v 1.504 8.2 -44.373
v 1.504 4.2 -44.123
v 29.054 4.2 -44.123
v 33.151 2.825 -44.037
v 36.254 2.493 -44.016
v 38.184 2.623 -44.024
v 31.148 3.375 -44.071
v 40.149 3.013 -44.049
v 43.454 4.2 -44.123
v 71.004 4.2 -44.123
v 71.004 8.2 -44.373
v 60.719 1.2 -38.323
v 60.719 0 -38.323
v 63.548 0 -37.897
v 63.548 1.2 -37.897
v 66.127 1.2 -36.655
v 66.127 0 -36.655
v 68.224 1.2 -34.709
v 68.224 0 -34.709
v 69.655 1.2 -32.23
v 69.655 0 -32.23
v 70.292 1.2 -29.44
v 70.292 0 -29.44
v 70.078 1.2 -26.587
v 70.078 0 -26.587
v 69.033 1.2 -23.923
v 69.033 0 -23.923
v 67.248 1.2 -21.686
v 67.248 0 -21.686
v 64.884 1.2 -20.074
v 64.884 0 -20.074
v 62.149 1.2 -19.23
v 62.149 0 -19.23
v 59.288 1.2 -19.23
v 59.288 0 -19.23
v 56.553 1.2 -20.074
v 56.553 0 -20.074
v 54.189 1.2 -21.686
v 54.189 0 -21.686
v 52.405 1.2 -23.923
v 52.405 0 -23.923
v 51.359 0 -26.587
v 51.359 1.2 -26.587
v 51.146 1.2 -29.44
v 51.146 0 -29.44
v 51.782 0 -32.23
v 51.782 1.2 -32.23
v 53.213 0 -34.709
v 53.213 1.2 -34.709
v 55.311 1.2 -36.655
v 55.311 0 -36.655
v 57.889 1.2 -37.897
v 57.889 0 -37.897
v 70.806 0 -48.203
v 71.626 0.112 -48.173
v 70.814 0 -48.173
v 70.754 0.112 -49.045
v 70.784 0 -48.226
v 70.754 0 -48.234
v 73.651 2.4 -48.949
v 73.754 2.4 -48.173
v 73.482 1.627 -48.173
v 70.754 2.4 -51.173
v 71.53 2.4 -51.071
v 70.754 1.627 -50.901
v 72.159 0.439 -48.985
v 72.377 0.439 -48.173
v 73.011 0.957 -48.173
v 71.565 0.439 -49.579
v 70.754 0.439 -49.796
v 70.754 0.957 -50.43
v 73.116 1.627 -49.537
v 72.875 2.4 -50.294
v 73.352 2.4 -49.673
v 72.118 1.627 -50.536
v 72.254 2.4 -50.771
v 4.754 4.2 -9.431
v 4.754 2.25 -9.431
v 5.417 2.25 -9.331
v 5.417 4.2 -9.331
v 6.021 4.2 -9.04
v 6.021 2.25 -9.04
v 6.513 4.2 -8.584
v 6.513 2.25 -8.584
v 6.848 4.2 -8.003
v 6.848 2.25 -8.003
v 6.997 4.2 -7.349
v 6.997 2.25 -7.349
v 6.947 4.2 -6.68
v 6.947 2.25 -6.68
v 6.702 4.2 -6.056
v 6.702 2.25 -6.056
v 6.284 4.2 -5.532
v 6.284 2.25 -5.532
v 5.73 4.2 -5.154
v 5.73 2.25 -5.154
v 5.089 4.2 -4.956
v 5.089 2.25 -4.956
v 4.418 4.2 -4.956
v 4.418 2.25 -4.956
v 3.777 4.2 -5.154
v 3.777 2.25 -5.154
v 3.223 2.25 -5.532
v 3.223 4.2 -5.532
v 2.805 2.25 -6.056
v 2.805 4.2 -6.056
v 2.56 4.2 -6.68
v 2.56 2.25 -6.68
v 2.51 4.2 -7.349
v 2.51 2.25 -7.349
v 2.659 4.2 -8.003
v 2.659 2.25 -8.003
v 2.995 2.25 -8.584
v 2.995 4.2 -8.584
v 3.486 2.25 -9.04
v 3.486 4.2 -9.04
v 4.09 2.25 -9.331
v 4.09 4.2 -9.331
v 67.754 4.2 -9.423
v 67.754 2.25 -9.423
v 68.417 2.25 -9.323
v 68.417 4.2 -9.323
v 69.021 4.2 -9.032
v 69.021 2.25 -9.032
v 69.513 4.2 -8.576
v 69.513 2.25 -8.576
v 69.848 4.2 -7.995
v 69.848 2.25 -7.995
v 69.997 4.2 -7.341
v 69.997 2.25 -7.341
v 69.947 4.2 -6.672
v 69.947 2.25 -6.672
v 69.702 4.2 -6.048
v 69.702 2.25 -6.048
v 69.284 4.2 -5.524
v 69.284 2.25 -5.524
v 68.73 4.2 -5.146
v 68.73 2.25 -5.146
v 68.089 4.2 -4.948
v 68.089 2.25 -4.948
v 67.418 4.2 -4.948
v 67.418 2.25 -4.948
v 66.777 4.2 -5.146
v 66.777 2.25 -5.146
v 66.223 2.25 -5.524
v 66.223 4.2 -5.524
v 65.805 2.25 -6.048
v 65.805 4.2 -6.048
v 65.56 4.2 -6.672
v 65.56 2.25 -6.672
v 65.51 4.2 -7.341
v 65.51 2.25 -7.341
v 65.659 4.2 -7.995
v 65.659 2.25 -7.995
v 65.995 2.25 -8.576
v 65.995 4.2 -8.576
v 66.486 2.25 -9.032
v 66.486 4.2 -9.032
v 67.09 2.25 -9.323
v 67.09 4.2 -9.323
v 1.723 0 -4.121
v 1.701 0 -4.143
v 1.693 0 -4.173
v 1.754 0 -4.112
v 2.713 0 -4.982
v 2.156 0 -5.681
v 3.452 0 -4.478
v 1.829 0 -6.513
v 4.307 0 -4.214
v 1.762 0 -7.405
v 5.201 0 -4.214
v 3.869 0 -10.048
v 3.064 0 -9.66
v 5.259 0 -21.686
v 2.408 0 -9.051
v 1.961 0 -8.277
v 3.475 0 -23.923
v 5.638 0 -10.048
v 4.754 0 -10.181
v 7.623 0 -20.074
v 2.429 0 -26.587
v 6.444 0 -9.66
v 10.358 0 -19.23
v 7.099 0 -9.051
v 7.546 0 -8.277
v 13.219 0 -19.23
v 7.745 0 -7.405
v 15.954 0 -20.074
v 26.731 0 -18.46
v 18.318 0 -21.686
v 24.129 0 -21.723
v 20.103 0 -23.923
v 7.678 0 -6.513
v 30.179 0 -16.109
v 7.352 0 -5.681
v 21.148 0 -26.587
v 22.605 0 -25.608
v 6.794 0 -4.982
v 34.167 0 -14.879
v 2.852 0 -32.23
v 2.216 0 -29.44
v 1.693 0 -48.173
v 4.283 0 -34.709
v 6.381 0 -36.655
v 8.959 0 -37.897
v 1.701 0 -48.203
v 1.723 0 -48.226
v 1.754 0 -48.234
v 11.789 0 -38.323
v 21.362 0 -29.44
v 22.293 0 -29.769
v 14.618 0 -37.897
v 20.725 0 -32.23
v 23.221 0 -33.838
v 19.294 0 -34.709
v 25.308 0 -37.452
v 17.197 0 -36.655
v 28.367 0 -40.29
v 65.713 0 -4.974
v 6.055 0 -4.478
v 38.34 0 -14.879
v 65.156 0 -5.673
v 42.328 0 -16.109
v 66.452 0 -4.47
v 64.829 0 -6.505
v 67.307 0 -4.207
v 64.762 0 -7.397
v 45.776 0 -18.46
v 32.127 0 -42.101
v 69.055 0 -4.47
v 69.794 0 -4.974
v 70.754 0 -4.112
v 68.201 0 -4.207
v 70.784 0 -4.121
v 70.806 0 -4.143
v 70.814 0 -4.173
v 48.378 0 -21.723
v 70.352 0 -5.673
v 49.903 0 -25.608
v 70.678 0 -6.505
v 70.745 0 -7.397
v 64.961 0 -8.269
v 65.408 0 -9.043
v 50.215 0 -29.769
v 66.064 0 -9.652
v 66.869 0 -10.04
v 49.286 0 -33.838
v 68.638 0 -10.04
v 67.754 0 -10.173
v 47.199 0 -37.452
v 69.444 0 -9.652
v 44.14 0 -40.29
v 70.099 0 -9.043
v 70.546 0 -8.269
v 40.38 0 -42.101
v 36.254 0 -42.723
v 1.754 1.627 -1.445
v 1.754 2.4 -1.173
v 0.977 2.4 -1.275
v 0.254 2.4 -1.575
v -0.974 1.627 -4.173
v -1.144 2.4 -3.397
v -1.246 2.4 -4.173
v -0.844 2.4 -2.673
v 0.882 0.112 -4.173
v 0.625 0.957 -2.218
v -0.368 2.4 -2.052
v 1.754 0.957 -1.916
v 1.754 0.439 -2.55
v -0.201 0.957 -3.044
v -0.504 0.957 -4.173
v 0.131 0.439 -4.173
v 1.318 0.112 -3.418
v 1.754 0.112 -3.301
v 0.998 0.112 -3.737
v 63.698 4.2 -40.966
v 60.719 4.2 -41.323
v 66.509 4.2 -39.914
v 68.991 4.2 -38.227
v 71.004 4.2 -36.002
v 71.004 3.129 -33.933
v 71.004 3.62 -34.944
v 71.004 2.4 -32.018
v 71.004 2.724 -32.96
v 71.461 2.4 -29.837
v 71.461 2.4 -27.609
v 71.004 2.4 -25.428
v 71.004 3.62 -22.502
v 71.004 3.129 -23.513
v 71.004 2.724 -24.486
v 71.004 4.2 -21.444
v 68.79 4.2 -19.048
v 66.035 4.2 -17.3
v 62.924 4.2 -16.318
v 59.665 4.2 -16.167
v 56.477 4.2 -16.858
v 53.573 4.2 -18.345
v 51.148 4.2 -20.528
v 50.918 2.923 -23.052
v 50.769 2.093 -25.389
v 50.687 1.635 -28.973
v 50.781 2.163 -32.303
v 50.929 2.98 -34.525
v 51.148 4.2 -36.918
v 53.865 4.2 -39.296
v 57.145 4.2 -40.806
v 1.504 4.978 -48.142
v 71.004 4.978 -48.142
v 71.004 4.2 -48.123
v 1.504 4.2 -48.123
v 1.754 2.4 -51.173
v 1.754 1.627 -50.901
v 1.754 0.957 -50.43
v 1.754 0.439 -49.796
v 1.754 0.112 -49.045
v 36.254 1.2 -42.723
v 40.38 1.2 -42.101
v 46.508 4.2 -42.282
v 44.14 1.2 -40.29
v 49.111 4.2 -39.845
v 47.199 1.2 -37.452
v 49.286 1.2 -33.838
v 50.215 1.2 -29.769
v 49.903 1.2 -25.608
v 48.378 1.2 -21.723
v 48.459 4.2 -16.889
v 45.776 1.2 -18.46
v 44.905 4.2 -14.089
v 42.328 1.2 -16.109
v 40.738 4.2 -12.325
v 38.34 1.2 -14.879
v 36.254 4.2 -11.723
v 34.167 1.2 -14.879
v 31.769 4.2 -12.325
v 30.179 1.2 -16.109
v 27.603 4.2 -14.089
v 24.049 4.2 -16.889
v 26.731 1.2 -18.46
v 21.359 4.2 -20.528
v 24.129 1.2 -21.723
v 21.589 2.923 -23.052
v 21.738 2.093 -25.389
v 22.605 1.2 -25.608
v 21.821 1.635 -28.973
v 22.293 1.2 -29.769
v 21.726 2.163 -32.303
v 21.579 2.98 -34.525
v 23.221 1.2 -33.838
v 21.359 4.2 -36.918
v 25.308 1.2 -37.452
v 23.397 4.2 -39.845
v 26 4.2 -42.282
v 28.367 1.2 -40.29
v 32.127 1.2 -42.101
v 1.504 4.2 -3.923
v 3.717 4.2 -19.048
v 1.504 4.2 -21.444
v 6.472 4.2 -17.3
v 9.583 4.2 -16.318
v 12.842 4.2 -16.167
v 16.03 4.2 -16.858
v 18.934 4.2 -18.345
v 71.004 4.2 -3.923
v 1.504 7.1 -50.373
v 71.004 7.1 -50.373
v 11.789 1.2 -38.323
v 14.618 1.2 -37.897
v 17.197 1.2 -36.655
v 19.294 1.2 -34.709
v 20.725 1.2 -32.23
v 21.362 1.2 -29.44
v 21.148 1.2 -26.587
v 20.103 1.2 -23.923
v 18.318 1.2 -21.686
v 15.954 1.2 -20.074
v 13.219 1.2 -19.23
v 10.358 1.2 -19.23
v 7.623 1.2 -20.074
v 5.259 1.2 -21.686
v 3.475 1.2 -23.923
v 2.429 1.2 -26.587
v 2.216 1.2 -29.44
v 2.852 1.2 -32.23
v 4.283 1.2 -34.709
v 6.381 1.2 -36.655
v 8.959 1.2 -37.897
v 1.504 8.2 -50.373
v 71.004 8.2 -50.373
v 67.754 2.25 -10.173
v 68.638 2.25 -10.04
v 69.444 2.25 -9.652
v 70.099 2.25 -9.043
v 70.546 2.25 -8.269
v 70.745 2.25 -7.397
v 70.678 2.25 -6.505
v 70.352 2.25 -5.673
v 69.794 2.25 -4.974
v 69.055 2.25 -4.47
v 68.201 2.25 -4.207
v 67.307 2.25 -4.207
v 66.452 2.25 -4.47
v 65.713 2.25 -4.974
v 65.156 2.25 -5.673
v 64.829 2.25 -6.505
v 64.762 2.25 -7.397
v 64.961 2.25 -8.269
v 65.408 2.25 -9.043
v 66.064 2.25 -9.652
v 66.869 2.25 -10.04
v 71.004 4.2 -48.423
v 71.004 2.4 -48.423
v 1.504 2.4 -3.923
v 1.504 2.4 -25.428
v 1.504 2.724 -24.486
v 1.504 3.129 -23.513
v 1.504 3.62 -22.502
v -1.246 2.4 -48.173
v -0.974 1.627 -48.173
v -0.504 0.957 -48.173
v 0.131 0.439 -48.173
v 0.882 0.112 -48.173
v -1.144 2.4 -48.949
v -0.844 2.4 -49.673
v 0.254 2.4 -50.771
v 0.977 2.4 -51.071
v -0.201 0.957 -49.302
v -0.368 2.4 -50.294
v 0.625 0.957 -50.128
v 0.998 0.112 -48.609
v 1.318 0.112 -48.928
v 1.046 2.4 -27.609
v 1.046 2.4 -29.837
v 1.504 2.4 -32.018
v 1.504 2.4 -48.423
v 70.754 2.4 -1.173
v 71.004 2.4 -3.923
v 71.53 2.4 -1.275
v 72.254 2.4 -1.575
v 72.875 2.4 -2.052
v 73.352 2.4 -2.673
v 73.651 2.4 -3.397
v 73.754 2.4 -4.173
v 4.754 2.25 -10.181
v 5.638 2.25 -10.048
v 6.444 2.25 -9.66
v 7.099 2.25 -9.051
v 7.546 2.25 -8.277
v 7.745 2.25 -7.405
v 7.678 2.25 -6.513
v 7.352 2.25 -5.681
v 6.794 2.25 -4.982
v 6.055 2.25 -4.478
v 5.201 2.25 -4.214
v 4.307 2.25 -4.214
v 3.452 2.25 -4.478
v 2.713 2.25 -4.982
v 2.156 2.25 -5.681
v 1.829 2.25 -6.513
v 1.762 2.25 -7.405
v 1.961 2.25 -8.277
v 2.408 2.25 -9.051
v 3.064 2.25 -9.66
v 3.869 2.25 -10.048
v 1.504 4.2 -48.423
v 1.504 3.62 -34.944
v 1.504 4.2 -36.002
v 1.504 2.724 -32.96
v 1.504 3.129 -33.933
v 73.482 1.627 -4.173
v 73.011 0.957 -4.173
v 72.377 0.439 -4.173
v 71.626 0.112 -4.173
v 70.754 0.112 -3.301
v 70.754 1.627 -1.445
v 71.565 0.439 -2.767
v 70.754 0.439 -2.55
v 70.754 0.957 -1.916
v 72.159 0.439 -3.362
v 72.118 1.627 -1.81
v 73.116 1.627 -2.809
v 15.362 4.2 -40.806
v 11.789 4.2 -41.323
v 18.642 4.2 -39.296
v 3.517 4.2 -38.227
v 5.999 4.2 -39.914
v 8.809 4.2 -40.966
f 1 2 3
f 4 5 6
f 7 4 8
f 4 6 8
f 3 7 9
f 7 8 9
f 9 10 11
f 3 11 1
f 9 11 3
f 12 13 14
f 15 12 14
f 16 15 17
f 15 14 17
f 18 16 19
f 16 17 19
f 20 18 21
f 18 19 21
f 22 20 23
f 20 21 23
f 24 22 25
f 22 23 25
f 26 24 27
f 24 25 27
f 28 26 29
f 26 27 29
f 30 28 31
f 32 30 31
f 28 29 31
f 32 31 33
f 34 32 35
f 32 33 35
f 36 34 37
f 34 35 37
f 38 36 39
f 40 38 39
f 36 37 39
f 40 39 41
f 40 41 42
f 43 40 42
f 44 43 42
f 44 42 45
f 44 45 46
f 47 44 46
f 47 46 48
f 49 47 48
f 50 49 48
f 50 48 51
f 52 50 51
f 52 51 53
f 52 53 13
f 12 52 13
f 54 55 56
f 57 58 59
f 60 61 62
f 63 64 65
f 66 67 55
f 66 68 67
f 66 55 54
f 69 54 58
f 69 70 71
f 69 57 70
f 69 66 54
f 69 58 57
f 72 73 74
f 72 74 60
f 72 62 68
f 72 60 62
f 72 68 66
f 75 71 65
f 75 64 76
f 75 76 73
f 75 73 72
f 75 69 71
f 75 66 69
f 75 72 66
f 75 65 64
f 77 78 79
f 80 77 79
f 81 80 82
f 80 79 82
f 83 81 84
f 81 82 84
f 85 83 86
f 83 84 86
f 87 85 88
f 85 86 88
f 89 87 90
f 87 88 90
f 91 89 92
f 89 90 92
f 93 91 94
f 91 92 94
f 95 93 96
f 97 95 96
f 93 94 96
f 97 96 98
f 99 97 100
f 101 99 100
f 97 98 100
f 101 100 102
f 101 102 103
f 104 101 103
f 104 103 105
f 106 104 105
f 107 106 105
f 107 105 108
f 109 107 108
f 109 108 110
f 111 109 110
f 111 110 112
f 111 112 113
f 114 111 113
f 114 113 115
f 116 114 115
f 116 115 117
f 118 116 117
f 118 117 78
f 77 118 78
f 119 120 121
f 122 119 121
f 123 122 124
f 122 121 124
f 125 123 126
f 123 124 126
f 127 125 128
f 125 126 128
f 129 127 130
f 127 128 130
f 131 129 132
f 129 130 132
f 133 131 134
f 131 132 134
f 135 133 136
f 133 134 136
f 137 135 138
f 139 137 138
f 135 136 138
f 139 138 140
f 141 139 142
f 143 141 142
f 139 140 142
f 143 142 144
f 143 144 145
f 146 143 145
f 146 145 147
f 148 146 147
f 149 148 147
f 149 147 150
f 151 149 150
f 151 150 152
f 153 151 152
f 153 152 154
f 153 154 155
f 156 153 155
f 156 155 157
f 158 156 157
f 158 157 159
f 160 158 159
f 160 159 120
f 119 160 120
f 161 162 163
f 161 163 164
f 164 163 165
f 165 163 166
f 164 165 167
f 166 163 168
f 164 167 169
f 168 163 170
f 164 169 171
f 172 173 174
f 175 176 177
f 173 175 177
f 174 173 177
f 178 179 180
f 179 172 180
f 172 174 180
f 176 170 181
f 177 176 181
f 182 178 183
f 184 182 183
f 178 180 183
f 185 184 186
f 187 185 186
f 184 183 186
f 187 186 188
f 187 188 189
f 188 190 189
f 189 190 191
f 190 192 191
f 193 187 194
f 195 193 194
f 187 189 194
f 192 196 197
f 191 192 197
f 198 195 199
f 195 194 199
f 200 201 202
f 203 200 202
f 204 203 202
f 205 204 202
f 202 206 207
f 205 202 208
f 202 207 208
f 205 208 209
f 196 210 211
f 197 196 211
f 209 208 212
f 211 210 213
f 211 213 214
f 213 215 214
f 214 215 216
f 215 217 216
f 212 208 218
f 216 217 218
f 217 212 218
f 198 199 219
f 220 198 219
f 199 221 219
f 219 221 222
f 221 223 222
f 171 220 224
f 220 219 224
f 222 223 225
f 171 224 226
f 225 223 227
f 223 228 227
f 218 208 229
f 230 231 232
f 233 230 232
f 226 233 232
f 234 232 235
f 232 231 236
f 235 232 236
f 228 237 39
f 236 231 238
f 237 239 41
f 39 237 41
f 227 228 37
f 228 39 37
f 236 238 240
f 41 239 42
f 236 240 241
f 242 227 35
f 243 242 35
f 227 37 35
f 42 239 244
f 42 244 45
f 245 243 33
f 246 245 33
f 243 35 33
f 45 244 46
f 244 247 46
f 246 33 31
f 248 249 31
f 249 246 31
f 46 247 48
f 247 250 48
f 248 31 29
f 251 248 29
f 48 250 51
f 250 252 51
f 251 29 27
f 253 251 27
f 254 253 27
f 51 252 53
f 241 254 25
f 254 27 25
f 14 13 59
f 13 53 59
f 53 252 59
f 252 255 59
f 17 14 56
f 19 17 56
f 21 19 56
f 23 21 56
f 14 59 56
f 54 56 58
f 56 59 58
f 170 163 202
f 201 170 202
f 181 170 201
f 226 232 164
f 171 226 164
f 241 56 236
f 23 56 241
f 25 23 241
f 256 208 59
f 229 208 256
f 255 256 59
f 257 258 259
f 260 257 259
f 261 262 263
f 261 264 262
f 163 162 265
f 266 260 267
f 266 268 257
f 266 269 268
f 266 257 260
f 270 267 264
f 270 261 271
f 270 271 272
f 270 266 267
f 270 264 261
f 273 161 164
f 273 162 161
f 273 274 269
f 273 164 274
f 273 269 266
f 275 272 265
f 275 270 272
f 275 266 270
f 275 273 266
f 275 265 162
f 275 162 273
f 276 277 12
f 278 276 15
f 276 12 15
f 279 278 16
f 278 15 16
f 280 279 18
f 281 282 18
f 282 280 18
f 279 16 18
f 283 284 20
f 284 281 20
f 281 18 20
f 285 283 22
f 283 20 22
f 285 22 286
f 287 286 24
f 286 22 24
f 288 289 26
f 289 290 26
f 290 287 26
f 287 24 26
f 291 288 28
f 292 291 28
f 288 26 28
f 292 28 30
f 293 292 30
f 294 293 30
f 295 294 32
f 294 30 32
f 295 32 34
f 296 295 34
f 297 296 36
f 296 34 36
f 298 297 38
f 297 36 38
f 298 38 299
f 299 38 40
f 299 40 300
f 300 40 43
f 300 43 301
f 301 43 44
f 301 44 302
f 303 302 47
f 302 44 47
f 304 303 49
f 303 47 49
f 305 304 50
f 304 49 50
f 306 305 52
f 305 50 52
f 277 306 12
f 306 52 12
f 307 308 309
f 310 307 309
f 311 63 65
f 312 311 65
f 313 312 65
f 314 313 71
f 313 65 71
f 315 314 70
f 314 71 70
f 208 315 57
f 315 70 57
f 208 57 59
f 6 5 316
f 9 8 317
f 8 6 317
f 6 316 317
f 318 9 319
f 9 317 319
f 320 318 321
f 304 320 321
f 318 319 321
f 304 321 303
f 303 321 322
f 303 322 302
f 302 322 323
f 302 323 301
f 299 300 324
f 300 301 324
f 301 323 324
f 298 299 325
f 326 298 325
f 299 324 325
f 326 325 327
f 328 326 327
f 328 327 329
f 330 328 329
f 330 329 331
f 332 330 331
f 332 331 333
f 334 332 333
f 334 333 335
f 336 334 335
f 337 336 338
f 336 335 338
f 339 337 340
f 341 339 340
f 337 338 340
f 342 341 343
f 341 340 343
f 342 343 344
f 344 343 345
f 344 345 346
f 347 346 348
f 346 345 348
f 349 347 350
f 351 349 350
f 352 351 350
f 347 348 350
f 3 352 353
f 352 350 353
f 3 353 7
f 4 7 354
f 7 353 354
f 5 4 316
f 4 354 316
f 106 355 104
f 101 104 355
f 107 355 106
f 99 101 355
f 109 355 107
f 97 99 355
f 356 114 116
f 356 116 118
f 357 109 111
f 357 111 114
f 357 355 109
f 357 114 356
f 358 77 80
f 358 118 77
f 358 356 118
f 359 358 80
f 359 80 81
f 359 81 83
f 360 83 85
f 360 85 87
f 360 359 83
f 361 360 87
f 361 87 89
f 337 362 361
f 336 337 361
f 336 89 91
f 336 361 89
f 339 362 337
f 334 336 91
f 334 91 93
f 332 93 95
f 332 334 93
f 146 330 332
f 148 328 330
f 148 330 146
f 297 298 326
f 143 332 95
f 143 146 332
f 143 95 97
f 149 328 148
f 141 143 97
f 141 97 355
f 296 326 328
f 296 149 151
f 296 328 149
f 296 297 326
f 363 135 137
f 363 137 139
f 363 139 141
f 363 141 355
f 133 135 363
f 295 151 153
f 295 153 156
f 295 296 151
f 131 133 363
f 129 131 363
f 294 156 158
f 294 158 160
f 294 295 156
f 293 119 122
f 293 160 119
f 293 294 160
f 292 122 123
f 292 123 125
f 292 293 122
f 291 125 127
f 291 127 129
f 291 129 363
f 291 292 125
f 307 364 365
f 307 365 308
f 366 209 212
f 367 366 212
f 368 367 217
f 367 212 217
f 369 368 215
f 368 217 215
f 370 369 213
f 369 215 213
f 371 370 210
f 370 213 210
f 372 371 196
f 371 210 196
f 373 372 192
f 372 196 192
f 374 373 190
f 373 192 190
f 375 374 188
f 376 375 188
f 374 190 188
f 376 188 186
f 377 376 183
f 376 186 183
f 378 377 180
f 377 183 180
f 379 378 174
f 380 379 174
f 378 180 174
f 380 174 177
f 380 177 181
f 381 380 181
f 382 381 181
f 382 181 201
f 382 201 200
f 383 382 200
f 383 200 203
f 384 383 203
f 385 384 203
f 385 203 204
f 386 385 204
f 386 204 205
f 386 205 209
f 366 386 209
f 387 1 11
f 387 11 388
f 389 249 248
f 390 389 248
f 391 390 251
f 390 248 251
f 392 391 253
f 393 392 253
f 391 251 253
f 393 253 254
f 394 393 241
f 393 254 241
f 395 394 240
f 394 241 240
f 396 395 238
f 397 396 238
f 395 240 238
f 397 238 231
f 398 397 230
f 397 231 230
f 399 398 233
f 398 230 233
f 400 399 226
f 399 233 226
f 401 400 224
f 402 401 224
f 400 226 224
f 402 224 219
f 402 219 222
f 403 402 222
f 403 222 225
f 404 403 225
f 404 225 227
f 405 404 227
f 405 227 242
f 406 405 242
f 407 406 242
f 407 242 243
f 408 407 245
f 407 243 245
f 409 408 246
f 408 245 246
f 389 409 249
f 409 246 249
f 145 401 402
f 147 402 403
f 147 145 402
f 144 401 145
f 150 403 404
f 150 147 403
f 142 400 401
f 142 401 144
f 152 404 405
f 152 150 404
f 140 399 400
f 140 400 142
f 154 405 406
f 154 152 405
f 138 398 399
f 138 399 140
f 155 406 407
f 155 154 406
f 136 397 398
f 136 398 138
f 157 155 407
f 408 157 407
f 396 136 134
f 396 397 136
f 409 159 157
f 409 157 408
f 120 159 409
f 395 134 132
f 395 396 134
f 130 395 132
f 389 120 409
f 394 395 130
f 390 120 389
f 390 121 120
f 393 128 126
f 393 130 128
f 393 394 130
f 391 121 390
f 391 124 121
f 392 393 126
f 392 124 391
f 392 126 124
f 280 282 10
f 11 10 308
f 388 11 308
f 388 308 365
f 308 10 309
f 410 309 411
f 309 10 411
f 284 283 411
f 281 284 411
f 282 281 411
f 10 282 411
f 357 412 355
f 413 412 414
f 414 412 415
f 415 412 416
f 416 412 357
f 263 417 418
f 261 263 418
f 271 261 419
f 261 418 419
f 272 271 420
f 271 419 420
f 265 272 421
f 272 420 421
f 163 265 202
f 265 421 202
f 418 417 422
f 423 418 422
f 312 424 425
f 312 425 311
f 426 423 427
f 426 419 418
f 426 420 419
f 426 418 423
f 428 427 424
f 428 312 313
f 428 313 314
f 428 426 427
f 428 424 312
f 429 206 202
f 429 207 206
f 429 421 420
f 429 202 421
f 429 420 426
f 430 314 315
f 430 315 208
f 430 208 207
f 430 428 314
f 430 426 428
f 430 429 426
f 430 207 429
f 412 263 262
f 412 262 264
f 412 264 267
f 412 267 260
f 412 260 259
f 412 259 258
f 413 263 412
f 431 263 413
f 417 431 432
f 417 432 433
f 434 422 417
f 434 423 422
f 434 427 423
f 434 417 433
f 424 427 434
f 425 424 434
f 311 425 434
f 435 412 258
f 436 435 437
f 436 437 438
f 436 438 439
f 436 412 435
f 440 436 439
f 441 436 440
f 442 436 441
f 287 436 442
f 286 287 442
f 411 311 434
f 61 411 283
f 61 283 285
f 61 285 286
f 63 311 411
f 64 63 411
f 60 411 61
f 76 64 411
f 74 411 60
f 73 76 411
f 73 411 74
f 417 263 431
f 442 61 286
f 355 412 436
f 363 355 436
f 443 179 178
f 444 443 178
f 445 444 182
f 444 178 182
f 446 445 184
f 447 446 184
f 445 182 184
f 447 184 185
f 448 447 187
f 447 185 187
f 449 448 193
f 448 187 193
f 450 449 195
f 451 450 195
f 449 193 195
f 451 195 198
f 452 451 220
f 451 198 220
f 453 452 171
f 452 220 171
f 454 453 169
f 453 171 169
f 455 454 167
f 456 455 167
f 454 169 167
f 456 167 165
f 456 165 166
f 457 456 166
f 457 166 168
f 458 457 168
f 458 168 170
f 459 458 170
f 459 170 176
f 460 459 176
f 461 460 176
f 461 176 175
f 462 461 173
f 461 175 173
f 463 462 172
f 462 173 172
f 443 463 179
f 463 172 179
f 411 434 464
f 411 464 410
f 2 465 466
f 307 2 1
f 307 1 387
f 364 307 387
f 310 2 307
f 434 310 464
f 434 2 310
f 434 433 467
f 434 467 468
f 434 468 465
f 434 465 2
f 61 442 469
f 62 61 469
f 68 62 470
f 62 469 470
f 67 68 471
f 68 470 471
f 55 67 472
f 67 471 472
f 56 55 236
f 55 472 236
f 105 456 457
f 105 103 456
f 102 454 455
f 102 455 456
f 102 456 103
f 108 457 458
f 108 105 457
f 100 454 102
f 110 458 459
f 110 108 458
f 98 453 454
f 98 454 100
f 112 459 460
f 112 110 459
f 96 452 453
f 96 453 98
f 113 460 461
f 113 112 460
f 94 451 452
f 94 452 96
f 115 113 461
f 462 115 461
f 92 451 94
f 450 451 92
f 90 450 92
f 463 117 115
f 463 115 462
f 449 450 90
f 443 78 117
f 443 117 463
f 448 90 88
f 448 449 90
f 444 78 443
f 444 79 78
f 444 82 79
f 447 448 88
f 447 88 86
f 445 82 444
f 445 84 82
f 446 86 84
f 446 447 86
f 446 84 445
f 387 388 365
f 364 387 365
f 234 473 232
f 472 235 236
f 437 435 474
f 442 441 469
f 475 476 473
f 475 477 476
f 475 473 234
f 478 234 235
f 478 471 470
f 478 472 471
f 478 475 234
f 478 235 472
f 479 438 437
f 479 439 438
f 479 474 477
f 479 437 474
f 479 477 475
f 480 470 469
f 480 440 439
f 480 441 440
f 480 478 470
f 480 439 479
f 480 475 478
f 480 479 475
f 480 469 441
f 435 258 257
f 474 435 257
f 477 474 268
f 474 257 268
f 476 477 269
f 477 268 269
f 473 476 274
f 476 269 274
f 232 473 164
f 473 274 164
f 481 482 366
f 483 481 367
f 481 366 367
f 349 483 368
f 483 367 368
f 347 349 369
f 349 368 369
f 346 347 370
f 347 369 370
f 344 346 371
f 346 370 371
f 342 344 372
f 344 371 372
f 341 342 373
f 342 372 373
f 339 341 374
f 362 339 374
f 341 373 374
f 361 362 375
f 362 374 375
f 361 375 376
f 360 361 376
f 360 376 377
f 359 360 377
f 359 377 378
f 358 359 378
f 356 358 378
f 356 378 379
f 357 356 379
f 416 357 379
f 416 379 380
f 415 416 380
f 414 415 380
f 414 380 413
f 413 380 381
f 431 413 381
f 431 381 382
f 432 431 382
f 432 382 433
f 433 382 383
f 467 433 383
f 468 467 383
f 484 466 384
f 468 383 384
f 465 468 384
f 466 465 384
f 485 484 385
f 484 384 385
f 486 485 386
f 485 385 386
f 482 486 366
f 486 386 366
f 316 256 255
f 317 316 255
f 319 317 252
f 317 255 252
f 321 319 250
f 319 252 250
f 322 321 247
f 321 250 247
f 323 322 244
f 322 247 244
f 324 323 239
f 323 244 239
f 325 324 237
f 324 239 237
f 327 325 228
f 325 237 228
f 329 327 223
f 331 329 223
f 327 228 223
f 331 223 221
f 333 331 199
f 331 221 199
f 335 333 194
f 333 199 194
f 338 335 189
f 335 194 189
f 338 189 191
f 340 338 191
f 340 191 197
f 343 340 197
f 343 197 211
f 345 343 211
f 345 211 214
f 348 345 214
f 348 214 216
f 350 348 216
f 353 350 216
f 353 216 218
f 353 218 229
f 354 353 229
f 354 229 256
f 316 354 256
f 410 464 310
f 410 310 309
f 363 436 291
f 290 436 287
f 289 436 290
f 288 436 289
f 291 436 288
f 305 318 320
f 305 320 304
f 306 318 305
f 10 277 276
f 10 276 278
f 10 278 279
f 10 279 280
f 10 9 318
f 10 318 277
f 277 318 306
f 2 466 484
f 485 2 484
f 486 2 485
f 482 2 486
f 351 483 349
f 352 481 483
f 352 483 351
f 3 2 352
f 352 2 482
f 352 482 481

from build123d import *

# Parameters (mm, degrees)
SKETCH1_W           = 75
SKETCH1_H           = 50
BOSS_EXTRUDE1_DEPTH = 2.4
SKETCH2_W           = 69.5
SKETCH2_H           = 44.5
BOSS_EXTRUDE2_DEPTH = 1.8
SKETCH4_R           = 9.6
SKETCH4_R_2         = 14
SKETCH4_R_3         = 2.25
CUT_EXTRUDE1_DEPTH  = 90.866129507
BOSS_EXTRUDE3_DEPTH = 69.5
FILLET1_R           = 3
FILLET2_R           = 3
SKETCH7_R           = 3
CUT_EXTRUDE3_DEPTH  = 2.25
CHAMFER1_SIZE       = 3


with BuildPart() as part:
    # Sketch1 → Boss-Extrude1 (new body)
    with BuildSketch(Plane(origin=(0, 0, 0), x_dir=(1, 0, 0), z_dir=(0, 1, 0))):
        with Locations((36.253665689, 26.173020528)):
            Rectangle(SKETCH1_W, SKETCH1_H)
    extrude(amount=BOSS_EXTRUDE1_DEPTH)

    # Sketch2 → Boss-Extrude2 (add)
    with BuildSketch(Plane(origin=(0, 2.4, 0), x_dir=(1, 0, 0), z_dir=(0, 1, 0))):
        with Locations((36.253665689, 26.173020528)):
            Rectangle(SKETCH2_W, SKETCH2_H)
    extrude(amount=BOSS_EXTRUDE2_DEPTH)

    # Sketch4 → Cut-Extrude1 (cut, through all)
    with BuildSketch(Plane(origin=(0, 0, 0), x_dir=(-1, 0, 0), z_dir=(0, -1, 0))):
        with Locations(Location((-60.718665689, 28.723020528, 0), (0, 0, 90))):
            Circle(SKETCH4_R)
        with Locations(Location((-36.253665689, 28.723020528, 0), (0, 0, 90))):
            Circle(SKETCH4_R_2)
        with Locations(Location((-11.788665689, 28.723020528, 0), (0, 0, 90))):
            Circle(SKETCH4_R)
        with Locations(Location((-67.753665689, 7.173020528, 0), (0, 0, 90))):
            Circle(SKETCH4_R_3)
        with Locations(Location((-4.753665689, 7.180899965, 0), (0, 0, 90))):
            Circle(SKETCH4_R_3)
    extrude(amount=-CUT_EXTRUDE1_DEPTH, mode=Mode.SUBTRACT)

    # Sketch5 → Boss-Extrude3 (add)
    with BuildSketch(Plane(origin=(71.003665689, 0, 0), x_dir=(0, 0, -1), z_dir=(1, 0, 0))):
        Polygon((48.123020528, 4.2), (44.123020528, 4.2), (44.373020528, 8.2), (50.373020528, 8.2), (50.373020528, 7.1), (48.142477117, 4.978263585), align=None)
    extrude(amount=-BOSS_EXTRUDE3_DEPTH)

    # Fillet1
    fillet1_edges = [part.edges().sort_by_distance(p)[0] for p in [
        (-1.246334311, 1.2, -51.173020528),
        (73.753665689, 1.2, -51.173020528),
        (73.753665689, 1.2, -1.173020528),
        (-1.246334311, 1.2, -1.173020528),
    ]]
    fillet(fillet1_edges, radius=FILLET1_R)

    # Fillet2
    # the kernel refuses this fillet: 3 mm, written as the material it takes off along each edge
    with BuildSketch(Plane(origin=(1.753665689, 0, -48.173020528), x_dir=(-1, 0, 0), z_dir=(0, 0, 1))) as fillet2_piece_1:
        with BuildLine():
            CenterArc((0.060612309, -3), FILLET2_R, 11.536959033, 78.463040967)
            Line((3, -2.4), (3.058787754, -2.388))
            ThreePointArc((3.058787754, -2.388), (3.06, -1.2), (3.06, 0))
            Line((3.06, 0), (3, 0.06))
            Line((3, 0.06), (0.060612309, 0.06))
            Line((0.060612309, 0.06), (0.060612309, 0))
        make_face()
    revolve(axis=Axis((1.753665689, 0, -48.173020528), (0, -1, 0)), revolution_arc=90, mode=Mode.SUBTRACT)
    with BuildSketch(Plane(origin=(70.753665689, 0, -51.173020528), x_dir=(0, 0, 1), z_dir=(-1, 0, 0))) as fillet2_piece_2:
        with BuildLine():
            CenterArc((2.939387691, 3), FILLET2_R, 191.536959033, 78.463040967)
            Line((0, 2.4), (-0.058787754, 2.388))
            ThreePointArc((-0.058787754, 2.388), (-0.06, 1.2), (-0.06, 0))
            Line((-0.06, 0), (0, -0.06))
            Line((0, -0.06), (2.939387691, -0.06))
            Line((2.939387691, -0.06), (2.939387691, 0))
        make_face()
    extrude(amount=69, mode=Mode.SUBTRACT)
    with BuildSketch(Plane(origin=(70.753665689, 0, -48.173020528), x_dir=(1, 0, 0), z_dir=(0, 0, 1))) as fillet2_piece_3:
        with BuildLine():
            CenterArc((0.060612309, 3), FILLET2_R, 270, 78.463040967)
            Line((3, 2.4), (3.058787754, 2.388))
            ThreePointArc((3.058787754, 2.388), (3.06, 1.2), (3.06, 0))
            Line((3.06, 0), (3, -0.06))
            Line((3, -0.06), (0.060612309, -0.06))
            Line((0.060612309, -0.06), (0.060612309, 0))
        make_face()
    revolve(axis=Axis((70.753665689, 0, -48.173020528), (0, 1, 0)), revolution_arc=90, mode=Mode.SUBTRACT)
    with BuildSketch(Plane(origin=(73.753665689, 0, -4.173020528), x_dir=(-1, 0, 0), z_dir=(0, 0, -1)), Plane(origin=(-1.246334311, 0, -48.173020528), x_dir=(1, 0, 0), z_dir=(0, 0, 1))) as fillet2_piece_4:
        with BuildLine():
            CenterArc((2.939387691, 3), FILLET2_R, 191.536959033, 78.463040967)
            Line((0, 2.4), (-0.058787754, 2.388))
            ThreePointArc((-0.058787754, 2.388), (-0.06, 1.2), (-0.06, 0))
            Line((-0.06, 0), (0, -0.06))
            Line((0, -0.06), (2.939387691, -0.06))
            Line((2.939387691, -0.06), (2.939387691, 0))
        make_face()
    extrude(amount=44, mode=Mode.SUBTRACT)
    with BuildSketch(Plane(origin=(70.753665689, 0, -4.173020528), x_dir=(0, 0, 1), z_dir=(-1, 0, 0))) as fillet2_piece_5:
        with BuildLine():
            CenterArc((0.060612309, 3), FILLET2_R, 270, 78.463040967)
            Line((3, 2.4), (3.058787754, 2.388))
            ThreePointArc((3.058787754, 2.388), (3.06, 1.2), (3.06, 0))
            Line((3.06, 0), (3, -0.06))
            Line((3, -0.06), (0.060612309, -0.06))
            Line((0.060612309, -0.06), (0.060612309, 0))
        make_face()
    revolve(axis=Axis((70.753665689, 0, -4.173020528), (0, 1, 0)), revolution_arc=90, mode=Mode.SUBTRACT)
    with BuildSketch(Plane(origin=(1.753665689, 0, -1.173020528), x_dir=(0, 1.0, -1.5658770576478976e-12), z_dir=(1, 0, 0))) as fillet2_piece_6:
        with BuildLine():
            CenterArc((3, -2.939387691), FILLET2_R, 101.536959033, 78.463040967)
            Line((0, -2.939387691), (-0.06, -2.939387691))
            Line((-0.06, -2.939387691), (-0.06, 0))
            Line((-0.06, 0), (0, 0.06))
            ThreePointArc((0, 0.06), (1.2, 0.06), (2.388, 0.058787754))
            Line((2.388, 0.058787754), (2.4, 0))
        make_face()
    extrude(amount=69, mode=Mode.SUBTRACT)
    with BuildSketch(Plane(origin=(1.753665689, 0, -4.173020528), x_dir=(0, 0, 1), z_dir=(1, 0, 0))) as fillet2_piece_7:
        with BuildLine():
            CenterArc((0.060612309, -3), FILLET2_R, 11.536959033, 78.463040967)
            Line((3, -2.4), (3.058787754, -2.388))
            ThreePointArc((3.058787754, -2.388), (3.06, -1.2), (3.06, 0))
            Line((3.06, 0), (3, 0.06))
            Line((3, 0.06), (0.060612309, 0.06))
            Line((0.060612309, 0.06), (0.060612309, 0))
        make_face()
    revolve(axis=Axis((1.753665689, 0, -4.173020528), (0, -1, 0)), revolution_arc=90, mode=Mode.SUBTRACT)

    # Sketch7 → Cut-Extrude3 (cut)
    with BuildSketch(Plane.XZ):
        with Locations(Location((4.753665689, -7.180899965, 0), (0, 0, 270))):
            Circle(SKETCH7_R)
        with Locations(Location((67.753665689, -7.173020528, 0), (0, 0, 270))):
            Circle(SKETCH7_R)
    extrude(amount=-CUT_EXTRUDE3_DEPTH, mode=Mode.SUBTRACT)

    # Chamfer1
    # the kernel refuses this chamfer: 3 mm, written as the material it takes off along each edge
    with BuildSketch(Plane(origin=(11.788665689, 4.2, -28.723020528), x_dir=(0, 0, -1), z_dir=(-1, 0, 0))) as chamfer1_piece_1:
        Polygon((9.6 + CHAMFER1_SIZE, 0), (9.6, CHAMFER1_SIZE), (9.6, 0), align=None)
    revolve(axis=Axis((11.788665689, 4.2, -28.723020528), (0, -1, 0)), mode=Mode.SUBTRACT)
    with BuildSketch(Plane(origin=(36.253665689, 4.2, -28.723020528), x_dir=(0, 0, -1), z_dir=(-1, 0, 0))) as chamfer1_piece_2_section:
        Polygon((14 + CHAMFER1_SIZE, 0), (14, CHAMFER1_SIZE), (14, 0), align=None)
    chamfer1_piece_2 = revolve(axis=Axis((36.253665689, 4.2, -28.723020528), (0, -1, 0)), mode=Mode.PRIVATE)
    chamfer1_piece_2 = split(chamfer1_piece_2, bisect_by=Plane(origin=(36.253665689, 0.839630842, -43.912997455), z_dir=(0, 0.06237828615517877, 0.9980525784828888)), keep=Keep.TOP, mode=Mode.PRIVATE)
    add(chamfer1_piece_2, mode=Mode.SUBTRACT)
    with BuildSketch(Plane(origin=(60.718665689, 4.2, -28.723020528), x_dir=(0, 0, -1), z_dir=(-1, 0, 0))) as chamfer1_piece_3:
        Polygon((9.6 + CHAMFER1_SIZE, 0), (9.6, CHAMFER1_SIZE), (9.6, 0), align=None)
    revolve(axis=Axis((60.718665689, 4.2, -28.723020528), (0, -1, 0)), mode=Mode.SUBTRACT)


solid = part.part
